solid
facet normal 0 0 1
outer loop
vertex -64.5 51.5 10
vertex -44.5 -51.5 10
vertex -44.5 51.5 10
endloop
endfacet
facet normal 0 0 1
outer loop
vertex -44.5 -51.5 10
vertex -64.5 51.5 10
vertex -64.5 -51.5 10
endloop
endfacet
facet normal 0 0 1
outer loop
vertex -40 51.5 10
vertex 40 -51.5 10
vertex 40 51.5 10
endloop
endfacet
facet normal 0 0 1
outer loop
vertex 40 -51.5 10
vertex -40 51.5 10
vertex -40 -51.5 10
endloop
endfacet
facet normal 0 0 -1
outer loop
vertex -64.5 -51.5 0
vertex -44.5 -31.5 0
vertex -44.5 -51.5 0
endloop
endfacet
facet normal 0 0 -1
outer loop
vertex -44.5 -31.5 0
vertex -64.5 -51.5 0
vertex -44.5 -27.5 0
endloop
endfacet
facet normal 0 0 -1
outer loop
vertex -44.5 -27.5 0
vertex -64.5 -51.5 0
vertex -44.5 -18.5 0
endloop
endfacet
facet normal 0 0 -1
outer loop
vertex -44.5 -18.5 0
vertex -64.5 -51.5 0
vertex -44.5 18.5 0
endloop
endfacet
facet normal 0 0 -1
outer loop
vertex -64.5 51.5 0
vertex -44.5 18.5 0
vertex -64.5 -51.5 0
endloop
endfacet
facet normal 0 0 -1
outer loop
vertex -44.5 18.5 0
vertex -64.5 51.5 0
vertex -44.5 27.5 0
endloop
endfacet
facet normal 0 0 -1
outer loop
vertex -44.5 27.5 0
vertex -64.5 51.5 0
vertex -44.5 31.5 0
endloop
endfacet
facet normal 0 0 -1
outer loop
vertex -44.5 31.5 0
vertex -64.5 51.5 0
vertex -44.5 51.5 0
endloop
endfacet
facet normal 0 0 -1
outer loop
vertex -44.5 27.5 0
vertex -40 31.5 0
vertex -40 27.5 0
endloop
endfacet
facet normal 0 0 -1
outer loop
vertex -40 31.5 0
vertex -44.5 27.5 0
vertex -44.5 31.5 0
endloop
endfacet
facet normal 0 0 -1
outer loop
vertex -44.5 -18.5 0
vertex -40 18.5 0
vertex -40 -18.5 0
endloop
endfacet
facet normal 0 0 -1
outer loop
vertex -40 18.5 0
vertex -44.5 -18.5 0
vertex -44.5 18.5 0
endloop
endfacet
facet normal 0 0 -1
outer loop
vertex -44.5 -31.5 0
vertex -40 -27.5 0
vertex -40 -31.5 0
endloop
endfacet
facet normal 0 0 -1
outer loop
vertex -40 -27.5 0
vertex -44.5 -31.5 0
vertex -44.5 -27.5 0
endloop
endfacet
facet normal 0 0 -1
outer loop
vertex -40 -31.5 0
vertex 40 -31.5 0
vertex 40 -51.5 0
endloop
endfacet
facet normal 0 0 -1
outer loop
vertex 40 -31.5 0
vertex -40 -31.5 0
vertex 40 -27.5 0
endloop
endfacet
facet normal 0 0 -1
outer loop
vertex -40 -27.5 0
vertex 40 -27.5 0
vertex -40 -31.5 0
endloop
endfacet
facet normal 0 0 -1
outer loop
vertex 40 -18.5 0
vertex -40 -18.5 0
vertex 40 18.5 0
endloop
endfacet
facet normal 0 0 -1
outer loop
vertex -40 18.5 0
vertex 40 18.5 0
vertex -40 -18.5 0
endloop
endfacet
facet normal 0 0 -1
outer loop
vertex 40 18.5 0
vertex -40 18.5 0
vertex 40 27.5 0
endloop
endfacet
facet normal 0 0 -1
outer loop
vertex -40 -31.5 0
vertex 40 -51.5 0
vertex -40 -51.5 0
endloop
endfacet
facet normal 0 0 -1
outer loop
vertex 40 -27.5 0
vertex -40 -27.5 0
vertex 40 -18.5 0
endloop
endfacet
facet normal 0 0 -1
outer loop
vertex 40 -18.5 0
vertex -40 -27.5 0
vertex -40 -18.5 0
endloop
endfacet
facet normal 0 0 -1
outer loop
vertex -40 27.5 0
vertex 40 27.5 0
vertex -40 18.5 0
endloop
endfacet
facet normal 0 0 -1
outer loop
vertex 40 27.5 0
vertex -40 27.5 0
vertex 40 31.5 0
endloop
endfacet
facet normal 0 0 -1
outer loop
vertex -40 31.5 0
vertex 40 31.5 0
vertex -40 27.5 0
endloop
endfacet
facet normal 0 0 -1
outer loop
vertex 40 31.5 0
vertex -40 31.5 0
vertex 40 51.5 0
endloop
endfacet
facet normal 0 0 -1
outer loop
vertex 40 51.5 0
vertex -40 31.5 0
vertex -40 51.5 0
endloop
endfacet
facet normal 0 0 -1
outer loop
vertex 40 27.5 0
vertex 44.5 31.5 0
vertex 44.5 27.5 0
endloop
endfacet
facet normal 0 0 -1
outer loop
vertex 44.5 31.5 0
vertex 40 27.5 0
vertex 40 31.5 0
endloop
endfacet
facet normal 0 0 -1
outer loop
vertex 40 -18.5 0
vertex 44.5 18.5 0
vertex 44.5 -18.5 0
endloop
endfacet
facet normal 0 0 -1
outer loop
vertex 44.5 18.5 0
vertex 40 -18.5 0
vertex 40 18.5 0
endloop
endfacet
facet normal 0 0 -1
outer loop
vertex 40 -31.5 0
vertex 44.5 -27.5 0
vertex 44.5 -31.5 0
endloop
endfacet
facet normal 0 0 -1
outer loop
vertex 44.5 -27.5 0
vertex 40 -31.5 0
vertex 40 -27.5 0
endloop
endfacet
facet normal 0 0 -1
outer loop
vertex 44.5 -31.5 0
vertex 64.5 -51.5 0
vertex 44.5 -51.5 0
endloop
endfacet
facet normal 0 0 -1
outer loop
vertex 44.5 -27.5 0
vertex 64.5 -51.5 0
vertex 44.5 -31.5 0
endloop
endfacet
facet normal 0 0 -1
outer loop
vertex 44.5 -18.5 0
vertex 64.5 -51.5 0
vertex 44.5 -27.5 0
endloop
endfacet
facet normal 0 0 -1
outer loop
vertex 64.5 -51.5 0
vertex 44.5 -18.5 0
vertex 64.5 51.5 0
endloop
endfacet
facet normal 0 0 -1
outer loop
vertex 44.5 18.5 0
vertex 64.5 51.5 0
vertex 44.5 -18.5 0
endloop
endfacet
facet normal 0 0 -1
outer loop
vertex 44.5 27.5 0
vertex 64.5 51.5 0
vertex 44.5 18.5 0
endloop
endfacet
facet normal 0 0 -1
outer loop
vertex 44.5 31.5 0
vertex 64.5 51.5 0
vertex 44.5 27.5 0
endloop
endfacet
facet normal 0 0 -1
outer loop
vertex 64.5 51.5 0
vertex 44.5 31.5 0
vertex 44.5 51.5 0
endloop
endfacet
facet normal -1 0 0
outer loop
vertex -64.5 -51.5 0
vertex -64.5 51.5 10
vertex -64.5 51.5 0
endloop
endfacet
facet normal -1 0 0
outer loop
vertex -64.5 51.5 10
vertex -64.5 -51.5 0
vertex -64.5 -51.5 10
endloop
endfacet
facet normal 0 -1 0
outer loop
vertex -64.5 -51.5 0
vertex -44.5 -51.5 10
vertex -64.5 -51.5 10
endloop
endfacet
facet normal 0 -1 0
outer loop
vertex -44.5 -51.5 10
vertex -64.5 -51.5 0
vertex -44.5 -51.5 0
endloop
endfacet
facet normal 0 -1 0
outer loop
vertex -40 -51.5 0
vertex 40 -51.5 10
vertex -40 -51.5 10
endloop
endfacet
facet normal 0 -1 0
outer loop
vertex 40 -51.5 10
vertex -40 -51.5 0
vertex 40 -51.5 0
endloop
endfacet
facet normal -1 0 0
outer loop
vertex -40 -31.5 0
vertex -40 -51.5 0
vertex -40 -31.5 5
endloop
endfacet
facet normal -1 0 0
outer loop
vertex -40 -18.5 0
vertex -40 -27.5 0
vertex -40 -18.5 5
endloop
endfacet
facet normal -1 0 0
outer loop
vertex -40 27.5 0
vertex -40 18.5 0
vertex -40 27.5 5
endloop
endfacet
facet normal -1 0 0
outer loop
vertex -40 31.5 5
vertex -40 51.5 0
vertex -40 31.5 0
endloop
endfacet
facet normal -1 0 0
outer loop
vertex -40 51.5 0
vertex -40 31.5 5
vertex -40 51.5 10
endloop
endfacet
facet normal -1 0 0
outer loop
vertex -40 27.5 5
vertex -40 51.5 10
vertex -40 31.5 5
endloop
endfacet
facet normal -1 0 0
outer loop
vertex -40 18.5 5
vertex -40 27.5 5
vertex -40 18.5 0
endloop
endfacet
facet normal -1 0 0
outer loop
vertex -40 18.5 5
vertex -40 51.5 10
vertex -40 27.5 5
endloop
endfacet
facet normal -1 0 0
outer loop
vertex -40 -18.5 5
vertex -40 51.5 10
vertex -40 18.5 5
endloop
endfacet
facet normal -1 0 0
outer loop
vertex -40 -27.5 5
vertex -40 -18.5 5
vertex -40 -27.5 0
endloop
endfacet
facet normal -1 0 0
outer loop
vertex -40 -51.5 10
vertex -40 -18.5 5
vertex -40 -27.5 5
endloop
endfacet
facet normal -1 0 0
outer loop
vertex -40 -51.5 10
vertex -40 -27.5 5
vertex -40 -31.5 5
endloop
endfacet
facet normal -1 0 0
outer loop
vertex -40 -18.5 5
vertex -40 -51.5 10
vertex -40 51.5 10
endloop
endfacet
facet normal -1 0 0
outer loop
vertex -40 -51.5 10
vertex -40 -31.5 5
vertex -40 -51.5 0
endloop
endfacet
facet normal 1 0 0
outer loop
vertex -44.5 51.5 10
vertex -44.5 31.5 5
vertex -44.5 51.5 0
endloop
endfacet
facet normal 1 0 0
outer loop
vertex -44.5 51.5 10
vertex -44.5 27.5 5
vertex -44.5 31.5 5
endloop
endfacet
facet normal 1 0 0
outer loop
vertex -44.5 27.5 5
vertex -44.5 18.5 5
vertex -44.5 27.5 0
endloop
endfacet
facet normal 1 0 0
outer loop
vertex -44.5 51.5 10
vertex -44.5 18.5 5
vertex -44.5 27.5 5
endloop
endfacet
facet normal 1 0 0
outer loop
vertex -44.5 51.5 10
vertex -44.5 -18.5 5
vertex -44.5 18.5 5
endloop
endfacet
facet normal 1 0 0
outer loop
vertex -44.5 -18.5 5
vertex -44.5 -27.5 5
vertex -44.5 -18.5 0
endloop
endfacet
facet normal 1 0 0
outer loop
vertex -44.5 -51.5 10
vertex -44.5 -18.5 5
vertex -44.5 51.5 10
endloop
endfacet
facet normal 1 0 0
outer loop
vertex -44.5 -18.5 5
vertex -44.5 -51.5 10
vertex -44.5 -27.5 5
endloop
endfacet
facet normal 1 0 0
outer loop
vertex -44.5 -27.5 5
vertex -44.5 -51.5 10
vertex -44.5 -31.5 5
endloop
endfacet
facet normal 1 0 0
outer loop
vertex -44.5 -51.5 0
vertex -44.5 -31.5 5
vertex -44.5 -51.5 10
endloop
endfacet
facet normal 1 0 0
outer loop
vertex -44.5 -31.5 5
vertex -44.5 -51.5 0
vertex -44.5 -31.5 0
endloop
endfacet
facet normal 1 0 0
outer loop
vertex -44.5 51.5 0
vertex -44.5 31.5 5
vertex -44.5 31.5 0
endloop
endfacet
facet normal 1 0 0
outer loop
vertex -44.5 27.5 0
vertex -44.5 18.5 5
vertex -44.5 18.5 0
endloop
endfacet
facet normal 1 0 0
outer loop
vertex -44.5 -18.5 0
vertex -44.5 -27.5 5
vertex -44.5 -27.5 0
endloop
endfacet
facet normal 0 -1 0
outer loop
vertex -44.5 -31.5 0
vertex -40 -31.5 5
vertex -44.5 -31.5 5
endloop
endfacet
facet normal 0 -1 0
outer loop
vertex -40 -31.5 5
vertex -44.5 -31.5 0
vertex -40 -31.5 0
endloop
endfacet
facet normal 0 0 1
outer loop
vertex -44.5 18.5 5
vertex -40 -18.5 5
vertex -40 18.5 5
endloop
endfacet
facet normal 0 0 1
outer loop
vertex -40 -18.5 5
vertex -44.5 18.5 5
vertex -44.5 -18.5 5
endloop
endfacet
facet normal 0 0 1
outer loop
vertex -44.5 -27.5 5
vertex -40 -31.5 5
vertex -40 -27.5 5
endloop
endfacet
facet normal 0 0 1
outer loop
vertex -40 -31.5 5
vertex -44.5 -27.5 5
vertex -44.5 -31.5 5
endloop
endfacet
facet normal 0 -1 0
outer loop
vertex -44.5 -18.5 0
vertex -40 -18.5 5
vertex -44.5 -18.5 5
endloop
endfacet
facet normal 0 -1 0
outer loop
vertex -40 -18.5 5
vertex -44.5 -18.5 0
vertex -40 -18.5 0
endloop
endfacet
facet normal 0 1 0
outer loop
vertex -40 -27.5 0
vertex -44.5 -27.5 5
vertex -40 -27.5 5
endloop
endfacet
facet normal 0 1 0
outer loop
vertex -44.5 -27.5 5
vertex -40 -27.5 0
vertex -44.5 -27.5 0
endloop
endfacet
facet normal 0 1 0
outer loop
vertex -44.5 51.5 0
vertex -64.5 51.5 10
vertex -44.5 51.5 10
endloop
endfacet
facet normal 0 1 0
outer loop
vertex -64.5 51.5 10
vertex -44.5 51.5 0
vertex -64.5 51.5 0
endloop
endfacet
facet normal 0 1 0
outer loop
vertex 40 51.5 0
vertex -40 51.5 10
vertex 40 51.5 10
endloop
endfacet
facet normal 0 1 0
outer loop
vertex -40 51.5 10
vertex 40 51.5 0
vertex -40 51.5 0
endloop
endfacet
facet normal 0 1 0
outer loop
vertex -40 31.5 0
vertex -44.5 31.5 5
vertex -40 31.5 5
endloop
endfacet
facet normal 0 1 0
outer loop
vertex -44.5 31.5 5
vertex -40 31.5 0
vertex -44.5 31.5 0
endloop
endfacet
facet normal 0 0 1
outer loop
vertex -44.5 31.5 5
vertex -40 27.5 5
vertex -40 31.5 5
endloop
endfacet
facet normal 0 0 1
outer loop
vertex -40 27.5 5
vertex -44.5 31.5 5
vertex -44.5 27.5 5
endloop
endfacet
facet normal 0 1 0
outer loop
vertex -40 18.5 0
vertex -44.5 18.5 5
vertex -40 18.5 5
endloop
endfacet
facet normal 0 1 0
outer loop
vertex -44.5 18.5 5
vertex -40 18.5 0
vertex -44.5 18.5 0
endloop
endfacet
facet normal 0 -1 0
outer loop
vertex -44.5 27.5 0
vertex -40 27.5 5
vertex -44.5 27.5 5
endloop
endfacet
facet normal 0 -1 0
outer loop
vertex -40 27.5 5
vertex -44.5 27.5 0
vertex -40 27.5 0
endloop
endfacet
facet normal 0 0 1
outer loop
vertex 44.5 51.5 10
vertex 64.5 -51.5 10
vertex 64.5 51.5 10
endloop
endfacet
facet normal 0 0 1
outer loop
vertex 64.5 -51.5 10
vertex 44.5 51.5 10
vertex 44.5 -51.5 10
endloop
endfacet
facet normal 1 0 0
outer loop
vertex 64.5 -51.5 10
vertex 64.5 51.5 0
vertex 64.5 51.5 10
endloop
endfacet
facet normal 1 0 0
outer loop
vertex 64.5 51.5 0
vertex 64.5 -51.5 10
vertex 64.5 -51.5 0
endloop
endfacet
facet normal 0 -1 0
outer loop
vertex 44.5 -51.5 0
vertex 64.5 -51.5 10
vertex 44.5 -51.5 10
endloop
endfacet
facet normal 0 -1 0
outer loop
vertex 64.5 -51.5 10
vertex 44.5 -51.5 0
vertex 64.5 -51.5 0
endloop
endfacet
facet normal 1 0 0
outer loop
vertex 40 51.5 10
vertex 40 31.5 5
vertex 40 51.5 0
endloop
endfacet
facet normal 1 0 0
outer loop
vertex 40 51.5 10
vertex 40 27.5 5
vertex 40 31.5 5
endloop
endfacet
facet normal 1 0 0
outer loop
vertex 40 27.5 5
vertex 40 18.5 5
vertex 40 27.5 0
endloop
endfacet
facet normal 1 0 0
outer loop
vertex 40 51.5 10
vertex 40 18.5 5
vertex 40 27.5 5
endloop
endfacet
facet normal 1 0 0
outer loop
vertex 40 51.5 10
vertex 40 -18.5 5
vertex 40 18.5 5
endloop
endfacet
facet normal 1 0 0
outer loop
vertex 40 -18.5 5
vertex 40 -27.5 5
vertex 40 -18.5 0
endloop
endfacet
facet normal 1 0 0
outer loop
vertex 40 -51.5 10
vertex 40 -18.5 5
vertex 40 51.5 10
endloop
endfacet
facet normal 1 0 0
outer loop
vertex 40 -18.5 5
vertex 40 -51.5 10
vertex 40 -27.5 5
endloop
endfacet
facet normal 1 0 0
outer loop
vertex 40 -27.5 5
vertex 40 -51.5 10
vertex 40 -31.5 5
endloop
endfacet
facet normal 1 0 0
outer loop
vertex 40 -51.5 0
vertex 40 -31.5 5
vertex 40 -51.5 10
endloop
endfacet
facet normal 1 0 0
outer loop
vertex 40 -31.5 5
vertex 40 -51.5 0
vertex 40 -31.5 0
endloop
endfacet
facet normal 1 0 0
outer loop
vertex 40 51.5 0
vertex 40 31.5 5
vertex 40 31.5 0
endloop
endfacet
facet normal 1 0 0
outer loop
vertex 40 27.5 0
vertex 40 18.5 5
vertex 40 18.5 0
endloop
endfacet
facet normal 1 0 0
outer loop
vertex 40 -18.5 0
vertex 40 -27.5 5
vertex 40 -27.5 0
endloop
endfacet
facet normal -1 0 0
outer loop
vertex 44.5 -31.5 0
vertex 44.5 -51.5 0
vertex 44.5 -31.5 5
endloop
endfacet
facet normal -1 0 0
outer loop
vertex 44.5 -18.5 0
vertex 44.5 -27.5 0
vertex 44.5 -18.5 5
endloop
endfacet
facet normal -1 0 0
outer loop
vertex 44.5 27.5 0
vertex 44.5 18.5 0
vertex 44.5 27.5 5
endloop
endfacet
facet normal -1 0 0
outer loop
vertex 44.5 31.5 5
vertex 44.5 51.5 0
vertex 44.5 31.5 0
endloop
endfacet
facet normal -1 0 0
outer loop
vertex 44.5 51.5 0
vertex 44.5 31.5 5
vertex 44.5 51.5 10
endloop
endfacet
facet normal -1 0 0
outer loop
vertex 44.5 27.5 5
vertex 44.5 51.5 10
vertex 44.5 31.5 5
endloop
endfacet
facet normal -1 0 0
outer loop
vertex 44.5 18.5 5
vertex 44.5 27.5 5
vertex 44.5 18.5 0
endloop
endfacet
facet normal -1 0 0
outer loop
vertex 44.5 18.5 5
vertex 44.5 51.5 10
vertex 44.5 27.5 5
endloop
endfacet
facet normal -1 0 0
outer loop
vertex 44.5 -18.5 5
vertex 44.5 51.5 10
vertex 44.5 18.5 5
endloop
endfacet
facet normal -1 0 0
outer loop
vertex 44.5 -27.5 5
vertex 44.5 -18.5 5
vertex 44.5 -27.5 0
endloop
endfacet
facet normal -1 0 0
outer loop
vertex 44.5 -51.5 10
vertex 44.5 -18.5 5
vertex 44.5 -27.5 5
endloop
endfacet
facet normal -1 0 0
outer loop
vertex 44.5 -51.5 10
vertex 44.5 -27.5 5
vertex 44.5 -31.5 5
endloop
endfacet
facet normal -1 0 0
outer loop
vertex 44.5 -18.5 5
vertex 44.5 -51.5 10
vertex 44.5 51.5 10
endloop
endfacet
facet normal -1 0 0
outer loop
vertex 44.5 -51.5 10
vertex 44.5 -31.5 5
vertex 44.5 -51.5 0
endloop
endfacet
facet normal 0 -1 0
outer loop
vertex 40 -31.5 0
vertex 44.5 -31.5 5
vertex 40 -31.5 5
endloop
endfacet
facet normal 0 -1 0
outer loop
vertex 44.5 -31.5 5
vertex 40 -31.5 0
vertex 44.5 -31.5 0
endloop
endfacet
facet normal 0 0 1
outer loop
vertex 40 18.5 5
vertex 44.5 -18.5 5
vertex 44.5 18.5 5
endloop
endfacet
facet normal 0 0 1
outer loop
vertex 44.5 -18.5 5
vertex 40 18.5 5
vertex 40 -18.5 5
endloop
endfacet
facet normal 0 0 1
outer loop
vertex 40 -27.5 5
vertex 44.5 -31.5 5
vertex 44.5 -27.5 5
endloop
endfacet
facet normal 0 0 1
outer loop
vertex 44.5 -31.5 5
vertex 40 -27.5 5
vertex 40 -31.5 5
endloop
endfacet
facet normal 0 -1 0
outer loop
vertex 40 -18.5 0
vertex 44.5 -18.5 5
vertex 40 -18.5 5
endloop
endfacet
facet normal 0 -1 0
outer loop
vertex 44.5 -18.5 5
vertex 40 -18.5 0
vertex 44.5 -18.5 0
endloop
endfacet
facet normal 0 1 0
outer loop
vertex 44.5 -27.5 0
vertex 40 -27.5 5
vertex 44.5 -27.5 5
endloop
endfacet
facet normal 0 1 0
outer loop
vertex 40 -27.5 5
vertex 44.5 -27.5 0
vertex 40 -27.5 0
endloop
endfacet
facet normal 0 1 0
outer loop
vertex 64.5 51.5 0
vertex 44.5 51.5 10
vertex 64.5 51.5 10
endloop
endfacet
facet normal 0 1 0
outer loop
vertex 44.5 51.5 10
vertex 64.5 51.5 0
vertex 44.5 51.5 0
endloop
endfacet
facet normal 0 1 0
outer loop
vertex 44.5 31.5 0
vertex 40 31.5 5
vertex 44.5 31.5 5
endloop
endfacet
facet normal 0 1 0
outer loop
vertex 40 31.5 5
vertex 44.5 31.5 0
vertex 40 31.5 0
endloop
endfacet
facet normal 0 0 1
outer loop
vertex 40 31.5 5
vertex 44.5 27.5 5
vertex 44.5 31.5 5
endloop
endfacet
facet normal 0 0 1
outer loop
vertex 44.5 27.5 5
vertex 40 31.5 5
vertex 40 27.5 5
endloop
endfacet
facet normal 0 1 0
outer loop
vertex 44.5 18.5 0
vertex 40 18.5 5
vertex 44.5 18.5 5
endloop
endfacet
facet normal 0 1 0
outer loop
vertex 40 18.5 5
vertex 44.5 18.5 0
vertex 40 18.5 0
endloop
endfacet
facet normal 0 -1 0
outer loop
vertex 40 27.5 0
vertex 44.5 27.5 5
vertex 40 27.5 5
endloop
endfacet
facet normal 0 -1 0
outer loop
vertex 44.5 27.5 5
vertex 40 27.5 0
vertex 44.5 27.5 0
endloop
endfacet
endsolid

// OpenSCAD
module mirror_copy(v = [1, 0, 0])
{
    children();
    mirror(v) children();
}

t = 10;
holder_t = 4.5;
spool_size = 80;
rib = 20;
keel_size = 37;
sub_keel_size = 4;
spacing = 9;
width = rib + holder_t + spool_size + holder_t + rib;
height = rib * 2 + keel_size + sub_keel_size * 2 + spacing * 2;

module object()
{
    translate([-width/2, -height/2, 0])
    {
        difference()
        {
            cube([width/2, height/2, t]);
            translate([rib, 0 , 0]) cube([holder_t, rib, t]);
            translate([rib, rib, t/2]) cube([holder_t, keel_size/2 + spacing + sub_keel_size, t/2]); 
            translate([rib, rib+sub_keel_size, 0]) cube([holder_t, spacing, t]);
            
        }
    }
}

union() mirror_copy([1, 0, 0]) mirror_copy([0, 1, 0]) object();
